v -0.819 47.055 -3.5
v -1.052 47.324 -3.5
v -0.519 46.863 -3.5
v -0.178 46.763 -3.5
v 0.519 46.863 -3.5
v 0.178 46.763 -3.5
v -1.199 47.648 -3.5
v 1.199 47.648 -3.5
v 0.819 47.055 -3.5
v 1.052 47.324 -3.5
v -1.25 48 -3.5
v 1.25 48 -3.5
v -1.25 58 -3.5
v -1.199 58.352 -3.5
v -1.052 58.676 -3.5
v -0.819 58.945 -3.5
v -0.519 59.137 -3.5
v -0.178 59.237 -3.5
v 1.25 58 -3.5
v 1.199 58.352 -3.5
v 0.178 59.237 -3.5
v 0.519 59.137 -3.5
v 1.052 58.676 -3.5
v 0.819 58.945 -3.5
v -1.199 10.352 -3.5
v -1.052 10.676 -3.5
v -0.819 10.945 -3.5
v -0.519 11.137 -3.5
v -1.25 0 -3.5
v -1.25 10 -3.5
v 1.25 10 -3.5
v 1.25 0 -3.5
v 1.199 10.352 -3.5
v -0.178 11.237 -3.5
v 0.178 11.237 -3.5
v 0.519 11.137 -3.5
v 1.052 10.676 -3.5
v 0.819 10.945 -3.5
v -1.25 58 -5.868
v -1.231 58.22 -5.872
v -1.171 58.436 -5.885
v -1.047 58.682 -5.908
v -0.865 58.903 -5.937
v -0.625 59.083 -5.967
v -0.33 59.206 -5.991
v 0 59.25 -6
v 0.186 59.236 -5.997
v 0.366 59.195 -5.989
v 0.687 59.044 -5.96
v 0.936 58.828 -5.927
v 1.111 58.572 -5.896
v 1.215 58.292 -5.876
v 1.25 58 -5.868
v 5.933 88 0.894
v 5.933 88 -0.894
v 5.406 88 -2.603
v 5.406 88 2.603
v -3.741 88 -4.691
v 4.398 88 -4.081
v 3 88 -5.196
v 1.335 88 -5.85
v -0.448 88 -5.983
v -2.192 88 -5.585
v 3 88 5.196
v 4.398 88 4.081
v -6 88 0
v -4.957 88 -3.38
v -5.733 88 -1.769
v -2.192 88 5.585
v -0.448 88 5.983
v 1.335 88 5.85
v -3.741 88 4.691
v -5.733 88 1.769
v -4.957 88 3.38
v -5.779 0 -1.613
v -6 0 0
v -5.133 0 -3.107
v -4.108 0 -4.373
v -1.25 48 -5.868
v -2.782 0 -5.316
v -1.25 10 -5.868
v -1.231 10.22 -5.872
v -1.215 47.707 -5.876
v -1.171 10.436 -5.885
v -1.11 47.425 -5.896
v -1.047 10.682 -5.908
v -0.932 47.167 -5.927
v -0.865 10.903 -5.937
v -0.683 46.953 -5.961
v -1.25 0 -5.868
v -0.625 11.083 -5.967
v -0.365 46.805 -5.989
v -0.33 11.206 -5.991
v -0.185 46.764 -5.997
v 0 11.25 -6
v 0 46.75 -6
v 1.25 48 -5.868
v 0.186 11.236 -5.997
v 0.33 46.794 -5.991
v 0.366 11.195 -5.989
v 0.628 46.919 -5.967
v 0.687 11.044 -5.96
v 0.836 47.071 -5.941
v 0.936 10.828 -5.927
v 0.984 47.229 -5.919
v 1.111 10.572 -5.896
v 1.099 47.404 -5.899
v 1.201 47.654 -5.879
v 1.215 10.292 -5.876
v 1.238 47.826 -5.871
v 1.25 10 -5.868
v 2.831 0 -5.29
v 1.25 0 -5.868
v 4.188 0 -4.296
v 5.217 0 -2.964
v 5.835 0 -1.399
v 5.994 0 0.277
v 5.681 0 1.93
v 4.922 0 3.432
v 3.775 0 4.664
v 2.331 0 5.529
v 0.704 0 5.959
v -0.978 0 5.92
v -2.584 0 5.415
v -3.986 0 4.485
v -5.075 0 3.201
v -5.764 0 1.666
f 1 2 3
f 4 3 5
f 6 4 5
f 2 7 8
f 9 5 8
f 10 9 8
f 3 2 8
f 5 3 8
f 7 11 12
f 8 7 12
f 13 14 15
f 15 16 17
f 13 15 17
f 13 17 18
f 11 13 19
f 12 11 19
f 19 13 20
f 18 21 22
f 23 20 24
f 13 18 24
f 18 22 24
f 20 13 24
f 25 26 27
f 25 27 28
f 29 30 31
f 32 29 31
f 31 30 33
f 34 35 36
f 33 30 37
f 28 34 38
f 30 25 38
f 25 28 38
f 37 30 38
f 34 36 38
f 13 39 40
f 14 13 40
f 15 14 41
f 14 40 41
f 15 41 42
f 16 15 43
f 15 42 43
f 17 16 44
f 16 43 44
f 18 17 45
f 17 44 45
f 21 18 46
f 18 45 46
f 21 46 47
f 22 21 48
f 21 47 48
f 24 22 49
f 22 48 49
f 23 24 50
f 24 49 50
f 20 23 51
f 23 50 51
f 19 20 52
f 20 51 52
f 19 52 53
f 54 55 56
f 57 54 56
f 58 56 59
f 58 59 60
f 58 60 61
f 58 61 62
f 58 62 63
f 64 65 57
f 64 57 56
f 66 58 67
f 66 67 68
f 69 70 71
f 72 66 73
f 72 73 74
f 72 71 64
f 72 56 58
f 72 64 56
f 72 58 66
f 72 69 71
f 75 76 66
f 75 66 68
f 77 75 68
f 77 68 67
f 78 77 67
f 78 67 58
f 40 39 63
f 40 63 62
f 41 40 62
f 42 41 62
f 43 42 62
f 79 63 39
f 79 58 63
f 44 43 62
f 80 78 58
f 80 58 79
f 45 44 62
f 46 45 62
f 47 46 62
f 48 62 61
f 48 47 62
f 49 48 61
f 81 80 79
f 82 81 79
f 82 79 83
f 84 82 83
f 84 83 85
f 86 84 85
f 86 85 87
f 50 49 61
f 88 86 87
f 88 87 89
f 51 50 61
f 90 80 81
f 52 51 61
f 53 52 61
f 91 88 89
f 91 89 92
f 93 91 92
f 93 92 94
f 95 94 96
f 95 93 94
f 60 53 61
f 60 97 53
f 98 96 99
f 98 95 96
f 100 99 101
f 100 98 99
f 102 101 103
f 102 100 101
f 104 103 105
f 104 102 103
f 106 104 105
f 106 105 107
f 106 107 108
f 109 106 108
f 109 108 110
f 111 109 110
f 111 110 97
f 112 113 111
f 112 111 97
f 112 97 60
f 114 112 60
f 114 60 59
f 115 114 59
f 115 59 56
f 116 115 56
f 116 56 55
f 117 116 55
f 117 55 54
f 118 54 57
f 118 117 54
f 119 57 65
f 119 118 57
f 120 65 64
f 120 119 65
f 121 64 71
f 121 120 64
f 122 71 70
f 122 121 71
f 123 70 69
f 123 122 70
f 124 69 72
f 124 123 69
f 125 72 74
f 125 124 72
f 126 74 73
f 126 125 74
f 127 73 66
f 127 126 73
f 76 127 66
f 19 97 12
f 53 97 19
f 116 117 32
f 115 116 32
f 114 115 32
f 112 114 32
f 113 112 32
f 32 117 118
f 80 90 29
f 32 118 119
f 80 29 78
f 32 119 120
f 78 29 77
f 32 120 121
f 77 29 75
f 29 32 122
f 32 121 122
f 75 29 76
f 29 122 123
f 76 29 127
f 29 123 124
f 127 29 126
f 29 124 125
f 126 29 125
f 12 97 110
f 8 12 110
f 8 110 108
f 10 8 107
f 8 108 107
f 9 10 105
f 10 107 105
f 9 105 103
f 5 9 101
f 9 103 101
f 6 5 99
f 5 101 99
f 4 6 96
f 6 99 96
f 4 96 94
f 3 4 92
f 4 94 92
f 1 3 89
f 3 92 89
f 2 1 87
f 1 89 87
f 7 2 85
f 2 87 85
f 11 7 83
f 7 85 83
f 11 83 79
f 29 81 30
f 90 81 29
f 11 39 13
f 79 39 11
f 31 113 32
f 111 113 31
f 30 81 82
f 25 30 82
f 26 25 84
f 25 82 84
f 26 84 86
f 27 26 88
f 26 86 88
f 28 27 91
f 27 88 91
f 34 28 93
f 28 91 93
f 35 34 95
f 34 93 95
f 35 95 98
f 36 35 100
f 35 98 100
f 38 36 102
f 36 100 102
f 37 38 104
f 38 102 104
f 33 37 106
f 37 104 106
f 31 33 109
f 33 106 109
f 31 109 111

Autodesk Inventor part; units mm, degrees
sketch "Esboço1" plane through (0, 0, 0) normal (0, 1, 0) x (-1, 0, 0)
  circle A0 centre (0, 0) radius 6
  dimension "d0" = 12
extrude "Extrusão1" add sketch "Esboço1" along normal blind 88
ref_plane "Plano de trabalho1" through (0, 0, -6) normal (0, 0, 1) x (1, 0, 0)
ref_plane "Plano de trabalho2" through (0, 0, -6) normal (0, 0, 1) x (1, 0, 0)
ref_plane "Plano de trabalho3" through (0, 0, 6) normal (0, 0, 1) x (1, 0, 0)
sketch "Esboço2" plane through (0, 0, -6) normal (0, 0, 1) x (1, 0, 0)
  line L0 (0, 92.3715) -> (0, -4.0857) construction
  line L1 (-6, 0) -> (-6, 88) construction
  line L2 (-6, 88) -> (-6, 58) construction
  line L3 (-6, 58) -> (-6, 48) construction
  line L4 (0, 58) -> (0, 48) construction
  line L5 (-1.25, 58) -> (-1.25, 48)
  line L6 (1.25, 48) -> (1.25, 58)
  arc A0 (1.25, 58) -> (-1.25, 58) centre (0, 58) ccw
  arc A1 (-1.25, 48) -> (1.25, 48) centre (0, 48) ccw
  line L7 (-6, 0) -> (-6, 10) construction
  line L8 (0, 10) -> (0, 0) construction
  line L9 (-1.25, 10) -> (-1.25, 0)
  line L10 (1.25, 0) -> (1.25, 10)
  arc A2 (1.25, 10) -> (-1.25, 10) centre (0, 10) ccw
  arc A3 (-1.25, 0) -> (1.25, 0) centre (0, 0) ccw
  point P0 (0, 53)
  point P1 (0, 5)
  dimension "d4" = 30
  dimension "d5" = 10
  dimension "d6" = 2.5
  dimension "d7" = 10
  dimension "d8" = 2.5
extrude "Extrusão2" cut sketch "Esboço2" along normal blind 2.5
properties part number "eixo 4"
